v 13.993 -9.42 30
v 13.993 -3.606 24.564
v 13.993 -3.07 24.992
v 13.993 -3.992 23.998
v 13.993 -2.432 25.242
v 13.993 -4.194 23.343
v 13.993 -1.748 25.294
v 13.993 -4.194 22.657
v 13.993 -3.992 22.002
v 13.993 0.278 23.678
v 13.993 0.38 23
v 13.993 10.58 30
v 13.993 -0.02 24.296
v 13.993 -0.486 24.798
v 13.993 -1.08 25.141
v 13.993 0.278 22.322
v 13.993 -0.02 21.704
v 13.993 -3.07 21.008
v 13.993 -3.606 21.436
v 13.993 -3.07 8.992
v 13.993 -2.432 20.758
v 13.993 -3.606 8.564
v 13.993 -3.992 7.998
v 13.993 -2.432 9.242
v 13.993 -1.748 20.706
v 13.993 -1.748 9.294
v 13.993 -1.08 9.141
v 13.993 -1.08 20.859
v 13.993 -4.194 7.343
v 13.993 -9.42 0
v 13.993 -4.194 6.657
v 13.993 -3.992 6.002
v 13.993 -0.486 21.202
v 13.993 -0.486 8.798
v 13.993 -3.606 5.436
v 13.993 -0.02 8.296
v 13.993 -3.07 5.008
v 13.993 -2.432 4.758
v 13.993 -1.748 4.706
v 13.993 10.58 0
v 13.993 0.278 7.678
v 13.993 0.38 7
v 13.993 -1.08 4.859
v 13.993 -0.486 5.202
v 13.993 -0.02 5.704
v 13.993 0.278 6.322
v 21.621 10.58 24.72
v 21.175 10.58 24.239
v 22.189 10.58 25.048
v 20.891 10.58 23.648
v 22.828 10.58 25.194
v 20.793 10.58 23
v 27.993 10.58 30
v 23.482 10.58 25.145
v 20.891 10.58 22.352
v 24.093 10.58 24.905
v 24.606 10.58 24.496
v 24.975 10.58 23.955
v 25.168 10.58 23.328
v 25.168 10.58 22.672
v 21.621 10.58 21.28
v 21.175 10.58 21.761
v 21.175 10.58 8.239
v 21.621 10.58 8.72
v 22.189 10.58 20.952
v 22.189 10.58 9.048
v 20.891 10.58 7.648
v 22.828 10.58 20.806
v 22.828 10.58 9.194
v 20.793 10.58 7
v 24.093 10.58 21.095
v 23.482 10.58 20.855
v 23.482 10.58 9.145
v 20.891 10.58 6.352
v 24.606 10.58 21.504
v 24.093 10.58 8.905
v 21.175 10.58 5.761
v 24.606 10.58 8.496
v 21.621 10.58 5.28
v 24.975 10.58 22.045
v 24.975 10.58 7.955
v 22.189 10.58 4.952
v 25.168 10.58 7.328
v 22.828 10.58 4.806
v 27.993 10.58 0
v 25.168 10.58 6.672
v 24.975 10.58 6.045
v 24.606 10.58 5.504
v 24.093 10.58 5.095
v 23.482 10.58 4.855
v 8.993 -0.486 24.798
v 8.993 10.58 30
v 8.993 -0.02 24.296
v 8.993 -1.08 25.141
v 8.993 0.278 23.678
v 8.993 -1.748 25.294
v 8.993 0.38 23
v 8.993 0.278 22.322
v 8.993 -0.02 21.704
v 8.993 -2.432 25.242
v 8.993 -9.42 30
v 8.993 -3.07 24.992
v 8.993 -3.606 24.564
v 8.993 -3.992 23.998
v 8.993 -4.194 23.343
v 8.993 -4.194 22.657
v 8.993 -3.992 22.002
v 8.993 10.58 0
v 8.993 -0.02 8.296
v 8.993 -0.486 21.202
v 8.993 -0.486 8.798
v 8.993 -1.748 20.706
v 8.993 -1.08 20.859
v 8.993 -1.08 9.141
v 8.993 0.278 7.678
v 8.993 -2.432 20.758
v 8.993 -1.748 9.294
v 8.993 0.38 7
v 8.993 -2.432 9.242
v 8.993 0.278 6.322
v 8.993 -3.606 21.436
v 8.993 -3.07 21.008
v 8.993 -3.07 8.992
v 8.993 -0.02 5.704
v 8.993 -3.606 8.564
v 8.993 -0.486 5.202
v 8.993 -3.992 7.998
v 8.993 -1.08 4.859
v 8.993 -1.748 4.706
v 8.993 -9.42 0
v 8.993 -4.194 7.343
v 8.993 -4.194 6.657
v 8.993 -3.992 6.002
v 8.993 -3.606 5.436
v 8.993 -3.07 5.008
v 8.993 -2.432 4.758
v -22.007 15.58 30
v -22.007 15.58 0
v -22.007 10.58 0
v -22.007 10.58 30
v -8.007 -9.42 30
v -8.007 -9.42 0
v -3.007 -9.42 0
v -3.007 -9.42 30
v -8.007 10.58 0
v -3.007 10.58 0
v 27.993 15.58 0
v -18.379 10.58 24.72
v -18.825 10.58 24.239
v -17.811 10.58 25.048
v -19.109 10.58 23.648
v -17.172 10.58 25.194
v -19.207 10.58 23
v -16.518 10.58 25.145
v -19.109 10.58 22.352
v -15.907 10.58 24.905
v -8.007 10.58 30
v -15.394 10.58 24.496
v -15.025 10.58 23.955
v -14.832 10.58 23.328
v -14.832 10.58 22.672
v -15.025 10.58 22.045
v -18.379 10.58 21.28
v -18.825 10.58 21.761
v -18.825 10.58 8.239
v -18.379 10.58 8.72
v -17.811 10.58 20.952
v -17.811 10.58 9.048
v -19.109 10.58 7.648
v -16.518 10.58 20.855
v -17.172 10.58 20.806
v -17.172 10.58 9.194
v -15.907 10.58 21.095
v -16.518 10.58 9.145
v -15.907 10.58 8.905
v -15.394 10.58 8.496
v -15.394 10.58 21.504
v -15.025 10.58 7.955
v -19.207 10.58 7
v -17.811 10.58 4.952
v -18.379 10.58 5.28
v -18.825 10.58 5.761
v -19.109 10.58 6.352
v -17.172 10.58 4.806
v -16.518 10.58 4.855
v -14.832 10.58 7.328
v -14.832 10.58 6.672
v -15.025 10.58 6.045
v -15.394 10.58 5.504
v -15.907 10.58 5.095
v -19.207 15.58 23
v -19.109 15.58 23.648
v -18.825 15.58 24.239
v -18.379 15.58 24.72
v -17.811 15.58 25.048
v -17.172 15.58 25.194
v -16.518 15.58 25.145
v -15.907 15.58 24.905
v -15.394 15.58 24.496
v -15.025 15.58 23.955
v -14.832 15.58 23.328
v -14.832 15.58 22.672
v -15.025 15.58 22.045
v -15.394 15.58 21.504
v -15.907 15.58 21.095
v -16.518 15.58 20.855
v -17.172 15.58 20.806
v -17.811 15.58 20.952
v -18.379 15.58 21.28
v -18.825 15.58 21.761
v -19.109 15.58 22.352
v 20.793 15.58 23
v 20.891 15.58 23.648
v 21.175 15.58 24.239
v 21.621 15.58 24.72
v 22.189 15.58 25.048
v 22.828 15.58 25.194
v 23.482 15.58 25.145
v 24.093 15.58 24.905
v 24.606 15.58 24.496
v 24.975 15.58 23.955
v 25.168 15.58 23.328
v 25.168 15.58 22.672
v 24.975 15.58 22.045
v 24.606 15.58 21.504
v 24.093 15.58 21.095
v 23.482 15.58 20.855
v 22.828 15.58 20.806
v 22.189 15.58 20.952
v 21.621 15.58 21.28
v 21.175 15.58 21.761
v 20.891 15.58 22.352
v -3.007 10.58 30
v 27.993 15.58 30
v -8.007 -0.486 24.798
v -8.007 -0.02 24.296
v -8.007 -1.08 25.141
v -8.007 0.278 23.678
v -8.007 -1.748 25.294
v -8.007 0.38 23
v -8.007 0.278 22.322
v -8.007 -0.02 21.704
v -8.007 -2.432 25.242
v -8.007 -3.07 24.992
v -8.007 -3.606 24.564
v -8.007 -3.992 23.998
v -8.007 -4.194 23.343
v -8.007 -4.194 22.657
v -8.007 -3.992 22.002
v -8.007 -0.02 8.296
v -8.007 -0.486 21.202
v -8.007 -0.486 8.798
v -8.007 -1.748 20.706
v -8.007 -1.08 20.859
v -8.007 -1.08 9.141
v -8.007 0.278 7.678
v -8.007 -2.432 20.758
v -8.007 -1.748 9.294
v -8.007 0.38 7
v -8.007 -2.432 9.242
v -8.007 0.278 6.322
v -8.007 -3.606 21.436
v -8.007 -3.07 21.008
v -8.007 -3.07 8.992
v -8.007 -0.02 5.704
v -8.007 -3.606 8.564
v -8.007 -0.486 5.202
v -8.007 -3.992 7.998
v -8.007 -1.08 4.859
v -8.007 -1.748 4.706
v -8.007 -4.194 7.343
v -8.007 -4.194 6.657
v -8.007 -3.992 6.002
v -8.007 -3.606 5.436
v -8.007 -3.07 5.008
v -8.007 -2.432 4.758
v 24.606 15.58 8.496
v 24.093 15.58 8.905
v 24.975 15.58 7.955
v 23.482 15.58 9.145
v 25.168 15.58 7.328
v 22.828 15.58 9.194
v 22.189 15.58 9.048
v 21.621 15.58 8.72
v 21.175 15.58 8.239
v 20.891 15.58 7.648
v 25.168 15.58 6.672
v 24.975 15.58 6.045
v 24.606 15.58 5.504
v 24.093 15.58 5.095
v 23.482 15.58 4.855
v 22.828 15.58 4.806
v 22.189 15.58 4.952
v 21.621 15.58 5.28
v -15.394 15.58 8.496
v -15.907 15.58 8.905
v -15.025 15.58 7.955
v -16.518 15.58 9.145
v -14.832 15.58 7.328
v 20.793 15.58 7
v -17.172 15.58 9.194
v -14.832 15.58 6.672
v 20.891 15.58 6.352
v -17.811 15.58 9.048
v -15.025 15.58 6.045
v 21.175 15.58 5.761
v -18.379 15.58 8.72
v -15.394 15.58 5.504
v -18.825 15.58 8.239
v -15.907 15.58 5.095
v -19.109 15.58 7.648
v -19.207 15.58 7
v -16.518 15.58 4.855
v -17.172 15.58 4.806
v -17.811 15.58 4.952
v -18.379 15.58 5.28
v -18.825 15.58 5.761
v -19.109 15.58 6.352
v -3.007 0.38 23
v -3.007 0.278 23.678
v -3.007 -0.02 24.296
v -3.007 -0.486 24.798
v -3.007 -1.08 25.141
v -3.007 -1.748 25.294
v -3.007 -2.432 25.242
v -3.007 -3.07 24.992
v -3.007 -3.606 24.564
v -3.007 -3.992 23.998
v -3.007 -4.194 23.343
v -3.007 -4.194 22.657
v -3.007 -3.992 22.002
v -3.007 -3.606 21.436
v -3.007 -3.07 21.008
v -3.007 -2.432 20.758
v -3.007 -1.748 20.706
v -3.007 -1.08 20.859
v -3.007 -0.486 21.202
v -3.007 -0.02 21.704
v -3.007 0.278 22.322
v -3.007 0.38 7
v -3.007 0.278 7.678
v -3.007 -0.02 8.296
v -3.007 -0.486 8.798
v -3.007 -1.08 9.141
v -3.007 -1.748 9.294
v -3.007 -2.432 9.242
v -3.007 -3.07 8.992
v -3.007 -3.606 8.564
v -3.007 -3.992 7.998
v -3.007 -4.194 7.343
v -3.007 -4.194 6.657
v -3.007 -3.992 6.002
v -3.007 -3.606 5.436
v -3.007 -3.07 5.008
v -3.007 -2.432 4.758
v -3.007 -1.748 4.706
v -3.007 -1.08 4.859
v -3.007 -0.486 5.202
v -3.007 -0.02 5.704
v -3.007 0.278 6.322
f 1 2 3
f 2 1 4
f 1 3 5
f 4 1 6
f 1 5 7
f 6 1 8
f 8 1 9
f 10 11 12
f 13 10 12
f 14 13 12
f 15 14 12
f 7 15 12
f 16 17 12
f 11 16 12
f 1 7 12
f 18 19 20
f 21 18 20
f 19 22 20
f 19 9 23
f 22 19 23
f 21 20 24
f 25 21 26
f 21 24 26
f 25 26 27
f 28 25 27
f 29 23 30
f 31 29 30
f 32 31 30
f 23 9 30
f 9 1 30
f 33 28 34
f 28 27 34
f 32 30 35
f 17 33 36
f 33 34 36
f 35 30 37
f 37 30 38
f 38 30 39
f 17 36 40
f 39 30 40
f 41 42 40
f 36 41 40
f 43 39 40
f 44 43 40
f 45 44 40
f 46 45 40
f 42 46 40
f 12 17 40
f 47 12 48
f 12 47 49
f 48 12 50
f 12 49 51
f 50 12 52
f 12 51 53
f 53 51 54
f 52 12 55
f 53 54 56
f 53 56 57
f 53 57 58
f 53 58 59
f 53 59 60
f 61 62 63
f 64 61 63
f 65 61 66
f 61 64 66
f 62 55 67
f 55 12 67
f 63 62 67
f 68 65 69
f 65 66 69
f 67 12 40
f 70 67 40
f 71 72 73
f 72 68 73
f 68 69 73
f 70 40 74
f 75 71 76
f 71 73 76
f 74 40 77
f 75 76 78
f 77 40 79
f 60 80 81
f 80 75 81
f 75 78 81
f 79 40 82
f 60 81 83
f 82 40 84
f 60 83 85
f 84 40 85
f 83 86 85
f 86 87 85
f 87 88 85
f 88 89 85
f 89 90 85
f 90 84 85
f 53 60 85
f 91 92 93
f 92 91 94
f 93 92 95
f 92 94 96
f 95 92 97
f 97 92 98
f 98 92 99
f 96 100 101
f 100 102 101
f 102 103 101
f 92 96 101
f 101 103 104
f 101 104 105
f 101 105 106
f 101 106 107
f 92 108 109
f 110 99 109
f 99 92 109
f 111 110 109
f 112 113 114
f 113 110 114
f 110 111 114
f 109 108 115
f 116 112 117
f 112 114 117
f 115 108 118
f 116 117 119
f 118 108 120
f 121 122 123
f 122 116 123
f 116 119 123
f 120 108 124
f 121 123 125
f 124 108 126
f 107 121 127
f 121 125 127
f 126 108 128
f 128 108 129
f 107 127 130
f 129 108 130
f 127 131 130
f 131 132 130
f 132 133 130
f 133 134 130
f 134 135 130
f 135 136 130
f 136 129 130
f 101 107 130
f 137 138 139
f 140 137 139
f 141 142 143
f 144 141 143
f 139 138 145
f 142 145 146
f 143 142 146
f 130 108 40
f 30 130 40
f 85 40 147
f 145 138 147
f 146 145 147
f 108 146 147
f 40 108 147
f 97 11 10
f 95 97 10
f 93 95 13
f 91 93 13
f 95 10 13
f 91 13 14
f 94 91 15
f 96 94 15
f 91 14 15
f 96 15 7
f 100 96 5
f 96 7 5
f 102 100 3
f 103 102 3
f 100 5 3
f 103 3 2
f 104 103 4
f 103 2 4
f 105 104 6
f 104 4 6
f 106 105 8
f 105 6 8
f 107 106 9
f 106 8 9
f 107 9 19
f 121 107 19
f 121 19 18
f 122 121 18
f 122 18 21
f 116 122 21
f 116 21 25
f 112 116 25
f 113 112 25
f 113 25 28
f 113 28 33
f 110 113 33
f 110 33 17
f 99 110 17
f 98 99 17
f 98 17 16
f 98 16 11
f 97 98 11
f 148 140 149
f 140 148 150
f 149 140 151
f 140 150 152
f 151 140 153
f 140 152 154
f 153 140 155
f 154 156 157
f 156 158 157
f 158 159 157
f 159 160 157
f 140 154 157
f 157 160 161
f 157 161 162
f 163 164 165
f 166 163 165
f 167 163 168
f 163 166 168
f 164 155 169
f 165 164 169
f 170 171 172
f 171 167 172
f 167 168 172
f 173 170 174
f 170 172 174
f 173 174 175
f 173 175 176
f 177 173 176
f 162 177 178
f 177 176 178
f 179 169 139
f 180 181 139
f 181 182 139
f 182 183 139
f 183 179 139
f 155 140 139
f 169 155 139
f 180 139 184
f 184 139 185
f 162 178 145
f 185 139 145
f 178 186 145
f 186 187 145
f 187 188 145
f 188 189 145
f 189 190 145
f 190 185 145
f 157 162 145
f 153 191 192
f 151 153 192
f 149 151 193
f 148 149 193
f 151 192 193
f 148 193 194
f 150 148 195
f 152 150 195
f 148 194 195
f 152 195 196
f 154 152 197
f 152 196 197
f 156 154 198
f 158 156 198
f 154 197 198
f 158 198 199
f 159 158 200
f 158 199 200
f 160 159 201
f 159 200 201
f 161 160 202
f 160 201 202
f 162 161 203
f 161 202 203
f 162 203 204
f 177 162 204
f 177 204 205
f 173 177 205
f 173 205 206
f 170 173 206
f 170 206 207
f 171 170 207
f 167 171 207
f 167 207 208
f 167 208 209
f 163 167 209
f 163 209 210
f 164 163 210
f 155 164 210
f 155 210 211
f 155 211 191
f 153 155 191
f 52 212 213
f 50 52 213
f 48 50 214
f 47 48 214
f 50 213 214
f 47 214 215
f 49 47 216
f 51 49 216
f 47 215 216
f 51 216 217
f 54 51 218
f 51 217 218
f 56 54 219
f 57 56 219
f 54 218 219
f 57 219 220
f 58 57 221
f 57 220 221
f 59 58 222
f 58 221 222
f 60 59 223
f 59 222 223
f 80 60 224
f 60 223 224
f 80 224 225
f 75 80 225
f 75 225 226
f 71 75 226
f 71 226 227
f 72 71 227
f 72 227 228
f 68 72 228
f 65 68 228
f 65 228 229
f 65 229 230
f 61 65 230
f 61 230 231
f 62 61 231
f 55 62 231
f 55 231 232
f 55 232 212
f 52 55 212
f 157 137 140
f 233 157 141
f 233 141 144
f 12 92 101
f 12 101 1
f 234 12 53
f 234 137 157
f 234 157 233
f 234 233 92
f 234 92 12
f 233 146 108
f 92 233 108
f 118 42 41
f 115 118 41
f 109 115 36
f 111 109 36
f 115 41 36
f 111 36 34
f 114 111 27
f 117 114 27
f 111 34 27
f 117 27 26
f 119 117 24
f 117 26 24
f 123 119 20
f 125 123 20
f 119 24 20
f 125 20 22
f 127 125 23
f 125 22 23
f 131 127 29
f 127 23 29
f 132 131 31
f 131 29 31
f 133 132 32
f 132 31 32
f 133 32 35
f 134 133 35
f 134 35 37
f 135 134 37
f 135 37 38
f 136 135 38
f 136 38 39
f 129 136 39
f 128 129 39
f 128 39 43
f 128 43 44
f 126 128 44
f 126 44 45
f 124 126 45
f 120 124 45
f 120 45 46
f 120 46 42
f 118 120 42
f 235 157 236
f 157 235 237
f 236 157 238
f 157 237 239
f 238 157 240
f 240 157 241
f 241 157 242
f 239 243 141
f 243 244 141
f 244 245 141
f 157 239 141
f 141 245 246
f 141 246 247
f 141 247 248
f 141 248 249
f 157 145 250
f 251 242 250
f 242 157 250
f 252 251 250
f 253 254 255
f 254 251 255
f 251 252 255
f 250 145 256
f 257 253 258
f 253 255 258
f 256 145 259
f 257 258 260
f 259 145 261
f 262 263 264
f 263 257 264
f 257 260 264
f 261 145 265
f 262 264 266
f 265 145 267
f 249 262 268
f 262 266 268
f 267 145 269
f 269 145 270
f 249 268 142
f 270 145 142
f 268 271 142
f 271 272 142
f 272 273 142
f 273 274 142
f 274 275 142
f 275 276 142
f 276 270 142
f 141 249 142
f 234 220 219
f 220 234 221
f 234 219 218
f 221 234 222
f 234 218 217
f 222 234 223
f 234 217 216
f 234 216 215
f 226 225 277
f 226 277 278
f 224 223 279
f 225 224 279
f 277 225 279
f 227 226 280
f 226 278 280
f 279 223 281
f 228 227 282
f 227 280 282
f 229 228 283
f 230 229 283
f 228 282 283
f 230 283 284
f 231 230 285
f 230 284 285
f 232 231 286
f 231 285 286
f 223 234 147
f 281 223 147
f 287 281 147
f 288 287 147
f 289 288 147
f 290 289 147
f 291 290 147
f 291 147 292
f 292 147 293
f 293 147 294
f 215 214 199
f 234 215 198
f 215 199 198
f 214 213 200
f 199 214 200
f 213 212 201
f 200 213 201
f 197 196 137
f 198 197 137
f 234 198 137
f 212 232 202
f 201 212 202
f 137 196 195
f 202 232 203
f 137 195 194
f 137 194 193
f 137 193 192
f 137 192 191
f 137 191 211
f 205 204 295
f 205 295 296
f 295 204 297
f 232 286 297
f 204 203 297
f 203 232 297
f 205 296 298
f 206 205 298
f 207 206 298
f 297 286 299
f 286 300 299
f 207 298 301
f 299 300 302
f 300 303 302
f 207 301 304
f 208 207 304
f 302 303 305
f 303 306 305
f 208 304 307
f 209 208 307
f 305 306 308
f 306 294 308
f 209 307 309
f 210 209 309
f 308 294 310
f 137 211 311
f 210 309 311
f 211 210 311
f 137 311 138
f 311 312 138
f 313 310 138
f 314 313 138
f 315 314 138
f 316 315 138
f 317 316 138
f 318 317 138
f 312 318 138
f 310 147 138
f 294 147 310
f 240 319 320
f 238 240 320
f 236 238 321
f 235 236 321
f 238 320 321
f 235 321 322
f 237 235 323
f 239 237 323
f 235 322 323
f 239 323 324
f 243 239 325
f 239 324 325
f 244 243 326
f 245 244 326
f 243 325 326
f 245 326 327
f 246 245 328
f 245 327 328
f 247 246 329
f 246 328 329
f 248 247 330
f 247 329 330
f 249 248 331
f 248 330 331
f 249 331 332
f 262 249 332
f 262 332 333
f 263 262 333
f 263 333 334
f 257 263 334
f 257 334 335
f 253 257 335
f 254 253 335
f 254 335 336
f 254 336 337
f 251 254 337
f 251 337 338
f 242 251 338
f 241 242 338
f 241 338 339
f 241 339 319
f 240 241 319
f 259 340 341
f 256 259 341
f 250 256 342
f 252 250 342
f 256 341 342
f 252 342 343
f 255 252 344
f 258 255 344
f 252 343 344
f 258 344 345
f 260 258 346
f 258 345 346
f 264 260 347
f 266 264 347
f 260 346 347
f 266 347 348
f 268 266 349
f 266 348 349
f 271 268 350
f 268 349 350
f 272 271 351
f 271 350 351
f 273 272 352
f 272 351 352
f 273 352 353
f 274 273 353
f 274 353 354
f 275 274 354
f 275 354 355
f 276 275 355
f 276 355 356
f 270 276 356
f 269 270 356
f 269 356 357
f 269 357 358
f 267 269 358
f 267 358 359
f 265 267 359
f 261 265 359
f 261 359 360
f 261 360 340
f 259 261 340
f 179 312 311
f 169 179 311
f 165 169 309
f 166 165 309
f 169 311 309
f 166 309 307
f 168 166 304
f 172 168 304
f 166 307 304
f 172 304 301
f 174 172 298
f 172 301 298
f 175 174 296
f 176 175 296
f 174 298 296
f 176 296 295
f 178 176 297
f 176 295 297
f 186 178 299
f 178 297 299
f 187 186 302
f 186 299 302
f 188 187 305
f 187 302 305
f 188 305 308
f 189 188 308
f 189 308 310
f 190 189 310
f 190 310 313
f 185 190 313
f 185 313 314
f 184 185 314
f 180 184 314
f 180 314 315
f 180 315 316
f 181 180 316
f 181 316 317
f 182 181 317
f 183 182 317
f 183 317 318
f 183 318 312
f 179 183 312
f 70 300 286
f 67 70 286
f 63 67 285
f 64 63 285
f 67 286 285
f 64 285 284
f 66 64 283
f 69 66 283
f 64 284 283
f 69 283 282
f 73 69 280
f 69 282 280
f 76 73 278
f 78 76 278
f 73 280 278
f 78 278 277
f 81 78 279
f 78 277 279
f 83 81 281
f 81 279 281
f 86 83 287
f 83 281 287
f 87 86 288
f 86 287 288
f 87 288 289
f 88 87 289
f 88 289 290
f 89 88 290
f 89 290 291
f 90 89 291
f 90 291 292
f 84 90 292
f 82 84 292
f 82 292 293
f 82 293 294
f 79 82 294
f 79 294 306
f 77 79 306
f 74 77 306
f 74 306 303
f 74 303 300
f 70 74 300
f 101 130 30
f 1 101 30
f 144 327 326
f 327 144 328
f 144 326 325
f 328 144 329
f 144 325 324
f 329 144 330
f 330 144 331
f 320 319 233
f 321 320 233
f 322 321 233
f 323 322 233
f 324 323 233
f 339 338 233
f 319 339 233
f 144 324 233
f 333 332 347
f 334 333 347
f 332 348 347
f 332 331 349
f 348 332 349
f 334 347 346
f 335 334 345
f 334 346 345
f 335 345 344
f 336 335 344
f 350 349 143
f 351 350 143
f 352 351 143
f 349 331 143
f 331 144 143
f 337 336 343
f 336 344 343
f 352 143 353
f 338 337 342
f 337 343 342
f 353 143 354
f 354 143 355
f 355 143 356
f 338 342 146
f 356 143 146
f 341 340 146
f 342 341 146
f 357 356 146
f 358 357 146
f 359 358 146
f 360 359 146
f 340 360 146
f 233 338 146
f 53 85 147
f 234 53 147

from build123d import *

# Parameters (mm, degrees)
PAD_DEPTH       = 30
SKETCH001_R     = 2.3
POCKET_DEPTH    = 36.001
SKETCH002_R     = 2.2
POCKET001_DEPTH = 25.001


with BuildPart() as part:
    # Sketch → Pad (new body)
    with BuildSketch(Plane.XY):
        Polygon((27.992845, 15.579944), (-22.007155, 15.579944), (-22.007155, 10.579944), (-8.007155, 10.579944), (-8.007155, -9.420056), (-3.007155, -9.420056), (-3.007155, 10.579944), (8.992845, 10.579944), (8.992845, -9.420056), (13.992845, -9.420056), (13.992845, 10.579944), (27.992845, 10.579944), align=None)
    extrude(amount=PAD_DEPTH)

    # Sketch001 → Pocket (cut, through all)
    with BuildSketch(Plane.YZ.offset(13.992845)):
        with Locations((-1.920056, 7)):
            Circle(SKETCH001_R)
        with Locations((-1.920056, 23)):
            Circle(SKETCH001_R)
    extrude(amount=-POCKET_DEPTH, mode=Mode.SUBTRACT)

    # Sketch002 → Pocket001 (cut, through all)
    with BuildSketch(Plane(origin=(0, 15.579944, 0), x_dir=(-1, 0, 0), z_dir=(0, 1, 0))):
        with Locations((-22.992845, 7)):
            Circle(SKETCH002_R)
        with Locations((17.007155, 7)):
            Circle(SKETCH002_R)
        with Locations((-22.992845, 23)):
            Circle(SKETCH002_R)
        with Locations((17.007155, 23)):
            Circle(SKETCH002_R)
    extrude(amount=-POCKET001_DEPTH, mode=Mode.SUBTRACT)


solid = part.part
